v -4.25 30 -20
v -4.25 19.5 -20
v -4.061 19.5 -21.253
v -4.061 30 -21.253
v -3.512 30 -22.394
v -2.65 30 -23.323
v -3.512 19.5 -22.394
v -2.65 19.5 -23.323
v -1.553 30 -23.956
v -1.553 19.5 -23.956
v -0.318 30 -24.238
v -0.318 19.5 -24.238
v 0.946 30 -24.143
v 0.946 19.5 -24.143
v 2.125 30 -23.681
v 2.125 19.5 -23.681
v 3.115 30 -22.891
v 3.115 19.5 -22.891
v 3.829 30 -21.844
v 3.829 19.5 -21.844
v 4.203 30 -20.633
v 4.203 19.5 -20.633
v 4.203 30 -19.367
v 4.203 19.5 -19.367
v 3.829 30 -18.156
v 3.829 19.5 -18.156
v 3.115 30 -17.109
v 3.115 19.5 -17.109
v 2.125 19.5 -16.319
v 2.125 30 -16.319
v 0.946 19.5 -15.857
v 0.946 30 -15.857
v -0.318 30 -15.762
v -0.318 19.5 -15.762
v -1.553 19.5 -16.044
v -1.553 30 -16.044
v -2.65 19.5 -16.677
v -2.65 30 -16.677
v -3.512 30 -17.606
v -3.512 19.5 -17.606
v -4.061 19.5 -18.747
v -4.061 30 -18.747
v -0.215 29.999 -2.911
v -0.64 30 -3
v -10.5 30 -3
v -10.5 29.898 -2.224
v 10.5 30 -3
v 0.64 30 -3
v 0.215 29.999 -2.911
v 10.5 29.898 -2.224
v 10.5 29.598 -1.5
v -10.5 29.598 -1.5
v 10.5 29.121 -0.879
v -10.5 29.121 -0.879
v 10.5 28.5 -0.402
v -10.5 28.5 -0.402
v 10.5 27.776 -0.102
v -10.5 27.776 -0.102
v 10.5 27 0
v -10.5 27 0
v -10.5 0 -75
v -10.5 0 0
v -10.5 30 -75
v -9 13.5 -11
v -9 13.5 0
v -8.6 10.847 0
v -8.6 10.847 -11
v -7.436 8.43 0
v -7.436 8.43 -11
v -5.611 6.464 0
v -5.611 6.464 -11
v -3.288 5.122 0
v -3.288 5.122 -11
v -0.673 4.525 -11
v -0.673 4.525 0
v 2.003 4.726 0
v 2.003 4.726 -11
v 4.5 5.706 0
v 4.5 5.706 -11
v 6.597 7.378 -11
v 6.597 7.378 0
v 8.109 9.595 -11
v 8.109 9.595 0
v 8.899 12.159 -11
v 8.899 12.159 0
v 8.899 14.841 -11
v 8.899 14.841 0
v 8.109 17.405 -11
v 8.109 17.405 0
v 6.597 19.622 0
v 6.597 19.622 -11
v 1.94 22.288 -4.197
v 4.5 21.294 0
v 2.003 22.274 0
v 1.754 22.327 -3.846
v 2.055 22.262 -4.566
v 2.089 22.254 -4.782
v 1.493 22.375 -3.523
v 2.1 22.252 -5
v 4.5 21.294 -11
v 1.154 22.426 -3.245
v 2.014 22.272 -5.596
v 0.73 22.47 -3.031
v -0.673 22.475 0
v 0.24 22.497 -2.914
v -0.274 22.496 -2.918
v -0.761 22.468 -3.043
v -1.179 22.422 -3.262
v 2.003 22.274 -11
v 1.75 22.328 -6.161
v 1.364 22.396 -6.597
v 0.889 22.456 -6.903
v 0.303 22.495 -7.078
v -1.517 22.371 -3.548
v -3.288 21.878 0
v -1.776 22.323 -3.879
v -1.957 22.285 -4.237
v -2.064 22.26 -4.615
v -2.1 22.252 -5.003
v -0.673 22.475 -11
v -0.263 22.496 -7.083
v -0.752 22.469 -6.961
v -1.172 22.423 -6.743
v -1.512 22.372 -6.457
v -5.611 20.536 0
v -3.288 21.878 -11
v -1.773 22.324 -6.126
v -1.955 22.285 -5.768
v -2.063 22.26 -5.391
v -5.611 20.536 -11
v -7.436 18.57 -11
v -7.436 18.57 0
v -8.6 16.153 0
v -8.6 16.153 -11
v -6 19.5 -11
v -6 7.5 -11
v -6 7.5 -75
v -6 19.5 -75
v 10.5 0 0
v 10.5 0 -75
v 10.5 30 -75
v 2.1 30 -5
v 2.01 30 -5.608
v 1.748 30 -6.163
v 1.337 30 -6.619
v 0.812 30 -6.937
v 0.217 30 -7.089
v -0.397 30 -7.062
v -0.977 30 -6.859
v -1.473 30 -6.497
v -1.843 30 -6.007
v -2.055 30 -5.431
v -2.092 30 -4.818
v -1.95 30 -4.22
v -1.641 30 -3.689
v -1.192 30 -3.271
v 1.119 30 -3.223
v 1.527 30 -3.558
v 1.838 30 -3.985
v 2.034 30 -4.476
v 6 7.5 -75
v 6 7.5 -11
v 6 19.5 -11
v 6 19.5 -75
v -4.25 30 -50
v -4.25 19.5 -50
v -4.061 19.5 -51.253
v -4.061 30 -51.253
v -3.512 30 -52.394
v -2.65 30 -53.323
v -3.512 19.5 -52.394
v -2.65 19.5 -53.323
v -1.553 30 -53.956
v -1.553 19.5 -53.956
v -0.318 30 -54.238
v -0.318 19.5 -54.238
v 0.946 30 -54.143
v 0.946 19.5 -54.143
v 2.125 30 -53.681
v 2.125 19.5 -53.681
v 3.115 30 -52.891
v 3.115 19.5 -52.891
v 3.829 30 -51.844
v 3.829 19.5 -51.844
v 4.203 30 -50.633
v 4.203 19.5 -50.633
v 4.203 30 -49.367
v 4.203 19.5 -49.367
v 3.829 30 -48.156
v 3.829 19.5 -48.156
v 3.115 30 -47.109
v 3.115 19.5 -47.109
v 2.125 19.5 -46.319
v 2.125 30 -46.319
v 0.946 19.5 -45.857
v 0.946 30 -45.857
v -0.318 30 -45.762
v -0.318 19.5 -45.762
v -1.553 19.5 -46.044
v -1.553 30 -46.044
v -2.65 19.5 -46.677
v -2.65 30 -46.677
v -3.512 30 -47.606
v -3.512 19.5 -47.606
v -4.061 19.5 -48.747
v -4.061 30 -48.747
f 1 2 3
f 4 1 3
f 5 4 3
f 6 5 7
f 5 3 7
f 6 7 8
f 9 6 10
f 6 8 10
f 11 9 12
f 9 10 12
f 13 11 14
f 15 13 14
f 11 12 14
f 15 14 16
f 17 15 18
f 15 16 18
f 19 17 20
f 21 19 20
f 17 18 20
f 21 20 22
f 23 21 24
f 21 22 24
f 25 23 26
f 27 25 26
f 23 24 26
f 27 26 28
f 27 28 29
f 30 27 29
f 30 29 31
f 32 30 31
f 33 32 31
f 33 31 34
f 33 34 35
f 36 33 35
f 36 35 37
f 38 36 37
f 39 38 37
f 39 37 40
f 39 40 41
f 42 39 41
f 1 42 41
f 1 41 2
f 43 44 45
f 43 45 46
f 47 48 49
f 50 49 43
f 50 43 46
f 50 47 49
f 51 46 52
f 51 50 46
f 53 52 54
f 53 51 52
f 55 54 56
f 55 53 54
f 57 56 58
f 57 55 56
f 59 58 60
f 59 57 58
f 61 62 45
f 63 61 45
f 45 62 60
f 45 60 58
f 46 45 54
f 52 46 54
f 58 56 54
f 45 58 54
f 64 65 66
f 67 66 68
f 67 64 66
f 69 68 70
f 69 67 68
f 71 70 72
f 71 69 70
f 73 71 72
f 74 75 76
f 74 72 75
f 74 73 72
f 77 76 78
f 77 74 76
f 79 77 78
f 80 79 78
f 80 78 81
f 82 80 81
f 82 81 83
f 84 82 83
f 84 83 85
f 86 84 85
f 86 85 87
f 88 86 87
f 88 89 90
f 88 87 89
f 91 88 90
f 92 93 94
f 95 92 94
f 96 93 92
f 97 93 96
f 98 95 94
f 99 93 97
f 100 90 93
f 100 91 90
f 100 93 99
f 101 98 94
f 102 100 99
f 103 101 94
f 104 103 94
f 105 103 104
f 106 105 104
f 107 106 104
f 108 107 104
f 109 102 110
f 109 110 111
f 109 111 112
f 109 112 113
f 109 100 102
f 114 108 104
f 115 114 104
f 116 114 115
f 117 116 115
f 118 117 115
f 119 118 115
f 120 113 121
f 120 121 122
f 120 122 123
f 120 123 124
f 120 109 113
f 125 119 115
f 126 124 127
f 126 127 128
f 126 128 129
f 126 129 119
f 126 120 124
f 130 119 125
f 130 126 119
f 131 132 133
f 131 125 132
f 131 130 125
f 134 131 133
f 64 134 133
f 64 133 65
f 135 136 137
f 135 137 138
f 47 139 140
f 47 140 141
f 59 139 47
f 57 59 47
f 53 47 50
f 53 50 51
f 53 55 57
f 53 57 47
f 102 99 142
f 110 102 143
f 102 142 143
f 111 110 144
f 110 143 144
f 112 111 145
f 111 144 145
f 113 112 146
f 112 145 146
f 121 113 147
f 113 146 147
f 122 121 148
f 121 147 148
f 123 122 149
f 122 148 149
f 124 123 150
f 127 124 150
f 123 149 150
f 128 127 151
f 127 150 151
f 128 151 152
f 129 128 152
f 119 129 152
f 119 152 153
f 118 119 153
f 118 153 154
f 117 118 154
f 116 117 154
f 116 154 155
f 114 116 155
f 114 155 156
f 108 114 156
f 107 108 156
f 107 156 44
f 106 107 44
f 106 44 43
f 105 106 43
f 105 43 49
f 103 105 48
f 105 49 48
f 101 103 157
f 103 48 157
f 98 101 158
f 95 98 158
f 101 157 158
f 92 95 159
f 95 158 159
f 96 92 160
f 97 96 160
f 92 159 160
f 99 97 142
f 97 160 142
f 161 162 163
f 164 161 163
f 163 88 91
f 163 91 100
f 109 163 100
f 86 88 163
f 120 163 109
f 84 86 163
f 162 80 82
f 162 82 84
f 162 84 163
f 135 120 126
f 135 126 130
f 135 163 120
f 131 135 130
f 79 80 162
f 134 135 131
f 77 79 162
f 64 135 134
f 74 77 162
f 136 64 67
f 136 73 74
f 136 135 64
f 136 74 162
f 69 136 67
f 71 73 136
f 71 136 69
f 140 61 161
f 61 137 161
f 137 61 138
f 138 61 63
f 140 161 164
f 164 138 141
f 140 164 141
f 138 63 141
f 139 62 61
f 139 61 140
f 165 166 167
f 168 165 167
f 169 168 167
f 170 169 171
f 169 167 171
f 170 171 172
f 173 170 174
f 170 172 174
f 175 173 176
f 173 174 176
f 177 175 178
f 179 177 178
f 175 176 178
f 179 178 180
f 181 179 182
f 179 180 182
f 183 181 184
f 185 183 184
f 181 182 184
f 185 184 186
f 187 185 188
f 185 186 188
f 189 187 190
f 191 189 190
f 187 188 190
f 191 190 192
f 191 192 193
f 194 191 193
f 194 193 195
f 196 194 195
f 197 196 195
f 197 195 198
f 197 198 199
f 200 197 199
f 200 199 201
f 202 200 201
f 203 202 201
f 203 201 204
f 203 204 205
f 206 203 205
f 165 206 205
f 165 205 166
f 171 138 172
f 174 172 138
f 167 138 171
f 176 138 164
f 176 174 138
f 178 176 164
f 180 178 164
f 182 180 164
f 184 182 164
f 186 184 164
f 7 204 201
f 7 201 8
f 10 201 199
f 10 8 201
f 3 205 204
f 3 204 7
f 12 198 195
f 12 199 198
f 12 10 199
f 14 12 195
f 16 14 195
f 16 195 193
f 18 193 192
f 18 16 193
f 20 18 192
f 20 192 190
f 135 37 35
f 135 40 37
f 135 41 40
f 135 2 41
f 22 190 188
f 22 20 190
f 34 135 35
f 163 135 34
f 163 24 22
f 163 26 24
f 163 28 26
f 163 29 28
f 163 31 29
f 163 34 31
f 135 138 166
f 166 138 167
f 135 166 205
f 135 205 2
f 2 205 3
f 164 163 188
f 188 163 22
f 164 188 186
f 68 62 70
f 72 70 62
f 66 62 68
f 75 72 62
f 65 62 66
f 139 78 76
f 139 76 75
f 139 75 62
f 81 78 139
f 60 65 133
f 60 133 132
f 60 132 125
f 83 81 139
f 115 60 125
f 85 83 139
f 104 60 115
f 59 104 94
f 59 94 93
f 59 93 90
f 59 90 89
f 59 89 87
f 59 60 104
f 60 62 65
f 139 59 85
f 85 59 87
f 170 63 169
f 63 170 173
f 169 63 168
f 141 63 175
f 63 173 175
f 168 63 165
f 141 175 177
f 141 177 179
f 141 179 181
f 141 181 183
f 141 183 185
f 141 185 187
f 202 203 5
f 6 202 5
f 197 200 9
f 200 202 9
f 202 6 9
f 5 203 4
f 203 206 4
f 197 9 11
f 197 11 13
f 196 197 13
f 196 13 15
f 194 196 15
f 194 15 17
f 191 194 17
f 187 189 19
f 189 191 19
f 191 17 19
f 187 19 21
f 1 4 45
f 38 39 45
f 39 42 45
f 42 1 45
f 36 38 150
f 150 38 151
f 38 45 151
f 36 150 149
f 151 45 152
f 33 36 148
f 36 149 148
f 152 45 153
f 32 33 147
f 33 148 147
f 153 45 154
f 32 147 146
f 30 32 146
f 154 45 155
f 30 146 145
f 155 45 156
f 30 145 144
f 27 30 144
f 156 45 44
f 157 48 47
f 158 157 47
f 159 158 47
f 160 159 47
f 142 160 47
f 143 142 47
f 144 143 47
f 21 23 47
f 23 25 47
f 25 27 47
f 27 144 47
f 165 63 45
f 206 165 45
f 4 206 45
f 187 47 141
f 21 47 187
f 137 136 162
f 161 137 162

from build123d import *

# Parameters (mm, degrees)
SKETCH_1_W               = 21
SKETCH_1_H               = 30
EXTRUDE_1_DEPTH          = 75
CUT_EXTRUDE_1_DEPTH      = 82.457043894
CUT_EXTRUDE_1_DEPTH_BACK = 11
SKETCH_2_R               = 9
SKETCH_3_W               = 12
SKETCH_3_H               = 12
CUT_EXTRUDE_2_DEPTH      = 72.45802964
FILLET_1_R               = 3
HOLE_WIZARD_M5_1_REACH   = 83.457
HOLE_WIZARD_M5_1_BORE_R  = 2.1
HOLE_WIZARD_M10_1_D      = 8.5
HOLE_WIZARD_M10_1_DEPTH  = 10.5


with BuildPart() as part:
    # 草图1 → 凸台-拉伸1 (new body)
    with BuildSketch(Plane.XY):
        with Locations((0, 15)):
            Rectangle(SKETCH_1_W, SKETCH_1_H)
    extrude(amount=-EXTRUDE_1_DEPTH)

    # 草图2 → 切除-拉伸1 (cut, two sides: drawn at the far end of the back side and taken through both)
    with BuildSketch(Plane.XY.offset(-CUT_EXTRUDE_1_DEPTH_BACK)):
        with Locations(Location((0, 13.5, 0), (0, 0, 180))):
            Circle(SKETCH_2_R)
    extrude(amount=CUT_EXTRUDE_1_DEPTH + CUT_EXTRUDE_1_DEPTH_BACK, mode=Mode.SUBTRACT)

    # 草图3 → 切除-拉伸2 (cut, through all)
    with BuildSketch(Plane.XY.offset(-11)):
        with Locations((0, 13.5)):
            Rectangle(SKETCH_3_W, SKETCH_3_H)
    extrude(amount=-CUT_EXTRUDE_2_DEPTH, mode=Mode.SUBTRACT)

    # 圆角1
    fillet_1_edges = [part.edges().sort_by_distance(p)[0] for p in [
        (0, 30, 0),
    ]]
    fillet(fillet_1_edges, radius=FILLET_1_R)

    # M5 螺纹孔1 bore → M5 螺纹孔1 (cut, up to next)
    with BuildSketch(Plane(origin=(0, 30, 0), x_dir=(1, 0, 0), z_dir=(0, 1, 0)), mode=Mode.PRIVATE) as hole_wizard_m5_1_sk1:
        with Locations((0, 5)):
            Circle(HOLE_WIZARD_M5_1_BORE_R)
    hole_wizard_m5_1_tool1 = extrude(hole_wizard_m5_1_sk1.sketch, amount=-HOLE_WIZARD_M5_1_REACH, mode=Mode.PRIVATE) & part.part
    add(hole_wizard_m5_1_tool1.solids().sort_by_distance((0, 30, -5))[0], mode=Mode.SUBTRACT)

    # M10 螺纹孔1
    with Locations(Plane(origin=(0, 30, 0), x_dir=(1, 0, 0), z_dir=(0, 1, 0))):
        with Locations((0, 20), (0, 50)):
            Hole(HOLE_WIZARD_M10_1_D / 2, depth=HOLE_WIZARD_M10_1_DEPTH)


solid = part.part
